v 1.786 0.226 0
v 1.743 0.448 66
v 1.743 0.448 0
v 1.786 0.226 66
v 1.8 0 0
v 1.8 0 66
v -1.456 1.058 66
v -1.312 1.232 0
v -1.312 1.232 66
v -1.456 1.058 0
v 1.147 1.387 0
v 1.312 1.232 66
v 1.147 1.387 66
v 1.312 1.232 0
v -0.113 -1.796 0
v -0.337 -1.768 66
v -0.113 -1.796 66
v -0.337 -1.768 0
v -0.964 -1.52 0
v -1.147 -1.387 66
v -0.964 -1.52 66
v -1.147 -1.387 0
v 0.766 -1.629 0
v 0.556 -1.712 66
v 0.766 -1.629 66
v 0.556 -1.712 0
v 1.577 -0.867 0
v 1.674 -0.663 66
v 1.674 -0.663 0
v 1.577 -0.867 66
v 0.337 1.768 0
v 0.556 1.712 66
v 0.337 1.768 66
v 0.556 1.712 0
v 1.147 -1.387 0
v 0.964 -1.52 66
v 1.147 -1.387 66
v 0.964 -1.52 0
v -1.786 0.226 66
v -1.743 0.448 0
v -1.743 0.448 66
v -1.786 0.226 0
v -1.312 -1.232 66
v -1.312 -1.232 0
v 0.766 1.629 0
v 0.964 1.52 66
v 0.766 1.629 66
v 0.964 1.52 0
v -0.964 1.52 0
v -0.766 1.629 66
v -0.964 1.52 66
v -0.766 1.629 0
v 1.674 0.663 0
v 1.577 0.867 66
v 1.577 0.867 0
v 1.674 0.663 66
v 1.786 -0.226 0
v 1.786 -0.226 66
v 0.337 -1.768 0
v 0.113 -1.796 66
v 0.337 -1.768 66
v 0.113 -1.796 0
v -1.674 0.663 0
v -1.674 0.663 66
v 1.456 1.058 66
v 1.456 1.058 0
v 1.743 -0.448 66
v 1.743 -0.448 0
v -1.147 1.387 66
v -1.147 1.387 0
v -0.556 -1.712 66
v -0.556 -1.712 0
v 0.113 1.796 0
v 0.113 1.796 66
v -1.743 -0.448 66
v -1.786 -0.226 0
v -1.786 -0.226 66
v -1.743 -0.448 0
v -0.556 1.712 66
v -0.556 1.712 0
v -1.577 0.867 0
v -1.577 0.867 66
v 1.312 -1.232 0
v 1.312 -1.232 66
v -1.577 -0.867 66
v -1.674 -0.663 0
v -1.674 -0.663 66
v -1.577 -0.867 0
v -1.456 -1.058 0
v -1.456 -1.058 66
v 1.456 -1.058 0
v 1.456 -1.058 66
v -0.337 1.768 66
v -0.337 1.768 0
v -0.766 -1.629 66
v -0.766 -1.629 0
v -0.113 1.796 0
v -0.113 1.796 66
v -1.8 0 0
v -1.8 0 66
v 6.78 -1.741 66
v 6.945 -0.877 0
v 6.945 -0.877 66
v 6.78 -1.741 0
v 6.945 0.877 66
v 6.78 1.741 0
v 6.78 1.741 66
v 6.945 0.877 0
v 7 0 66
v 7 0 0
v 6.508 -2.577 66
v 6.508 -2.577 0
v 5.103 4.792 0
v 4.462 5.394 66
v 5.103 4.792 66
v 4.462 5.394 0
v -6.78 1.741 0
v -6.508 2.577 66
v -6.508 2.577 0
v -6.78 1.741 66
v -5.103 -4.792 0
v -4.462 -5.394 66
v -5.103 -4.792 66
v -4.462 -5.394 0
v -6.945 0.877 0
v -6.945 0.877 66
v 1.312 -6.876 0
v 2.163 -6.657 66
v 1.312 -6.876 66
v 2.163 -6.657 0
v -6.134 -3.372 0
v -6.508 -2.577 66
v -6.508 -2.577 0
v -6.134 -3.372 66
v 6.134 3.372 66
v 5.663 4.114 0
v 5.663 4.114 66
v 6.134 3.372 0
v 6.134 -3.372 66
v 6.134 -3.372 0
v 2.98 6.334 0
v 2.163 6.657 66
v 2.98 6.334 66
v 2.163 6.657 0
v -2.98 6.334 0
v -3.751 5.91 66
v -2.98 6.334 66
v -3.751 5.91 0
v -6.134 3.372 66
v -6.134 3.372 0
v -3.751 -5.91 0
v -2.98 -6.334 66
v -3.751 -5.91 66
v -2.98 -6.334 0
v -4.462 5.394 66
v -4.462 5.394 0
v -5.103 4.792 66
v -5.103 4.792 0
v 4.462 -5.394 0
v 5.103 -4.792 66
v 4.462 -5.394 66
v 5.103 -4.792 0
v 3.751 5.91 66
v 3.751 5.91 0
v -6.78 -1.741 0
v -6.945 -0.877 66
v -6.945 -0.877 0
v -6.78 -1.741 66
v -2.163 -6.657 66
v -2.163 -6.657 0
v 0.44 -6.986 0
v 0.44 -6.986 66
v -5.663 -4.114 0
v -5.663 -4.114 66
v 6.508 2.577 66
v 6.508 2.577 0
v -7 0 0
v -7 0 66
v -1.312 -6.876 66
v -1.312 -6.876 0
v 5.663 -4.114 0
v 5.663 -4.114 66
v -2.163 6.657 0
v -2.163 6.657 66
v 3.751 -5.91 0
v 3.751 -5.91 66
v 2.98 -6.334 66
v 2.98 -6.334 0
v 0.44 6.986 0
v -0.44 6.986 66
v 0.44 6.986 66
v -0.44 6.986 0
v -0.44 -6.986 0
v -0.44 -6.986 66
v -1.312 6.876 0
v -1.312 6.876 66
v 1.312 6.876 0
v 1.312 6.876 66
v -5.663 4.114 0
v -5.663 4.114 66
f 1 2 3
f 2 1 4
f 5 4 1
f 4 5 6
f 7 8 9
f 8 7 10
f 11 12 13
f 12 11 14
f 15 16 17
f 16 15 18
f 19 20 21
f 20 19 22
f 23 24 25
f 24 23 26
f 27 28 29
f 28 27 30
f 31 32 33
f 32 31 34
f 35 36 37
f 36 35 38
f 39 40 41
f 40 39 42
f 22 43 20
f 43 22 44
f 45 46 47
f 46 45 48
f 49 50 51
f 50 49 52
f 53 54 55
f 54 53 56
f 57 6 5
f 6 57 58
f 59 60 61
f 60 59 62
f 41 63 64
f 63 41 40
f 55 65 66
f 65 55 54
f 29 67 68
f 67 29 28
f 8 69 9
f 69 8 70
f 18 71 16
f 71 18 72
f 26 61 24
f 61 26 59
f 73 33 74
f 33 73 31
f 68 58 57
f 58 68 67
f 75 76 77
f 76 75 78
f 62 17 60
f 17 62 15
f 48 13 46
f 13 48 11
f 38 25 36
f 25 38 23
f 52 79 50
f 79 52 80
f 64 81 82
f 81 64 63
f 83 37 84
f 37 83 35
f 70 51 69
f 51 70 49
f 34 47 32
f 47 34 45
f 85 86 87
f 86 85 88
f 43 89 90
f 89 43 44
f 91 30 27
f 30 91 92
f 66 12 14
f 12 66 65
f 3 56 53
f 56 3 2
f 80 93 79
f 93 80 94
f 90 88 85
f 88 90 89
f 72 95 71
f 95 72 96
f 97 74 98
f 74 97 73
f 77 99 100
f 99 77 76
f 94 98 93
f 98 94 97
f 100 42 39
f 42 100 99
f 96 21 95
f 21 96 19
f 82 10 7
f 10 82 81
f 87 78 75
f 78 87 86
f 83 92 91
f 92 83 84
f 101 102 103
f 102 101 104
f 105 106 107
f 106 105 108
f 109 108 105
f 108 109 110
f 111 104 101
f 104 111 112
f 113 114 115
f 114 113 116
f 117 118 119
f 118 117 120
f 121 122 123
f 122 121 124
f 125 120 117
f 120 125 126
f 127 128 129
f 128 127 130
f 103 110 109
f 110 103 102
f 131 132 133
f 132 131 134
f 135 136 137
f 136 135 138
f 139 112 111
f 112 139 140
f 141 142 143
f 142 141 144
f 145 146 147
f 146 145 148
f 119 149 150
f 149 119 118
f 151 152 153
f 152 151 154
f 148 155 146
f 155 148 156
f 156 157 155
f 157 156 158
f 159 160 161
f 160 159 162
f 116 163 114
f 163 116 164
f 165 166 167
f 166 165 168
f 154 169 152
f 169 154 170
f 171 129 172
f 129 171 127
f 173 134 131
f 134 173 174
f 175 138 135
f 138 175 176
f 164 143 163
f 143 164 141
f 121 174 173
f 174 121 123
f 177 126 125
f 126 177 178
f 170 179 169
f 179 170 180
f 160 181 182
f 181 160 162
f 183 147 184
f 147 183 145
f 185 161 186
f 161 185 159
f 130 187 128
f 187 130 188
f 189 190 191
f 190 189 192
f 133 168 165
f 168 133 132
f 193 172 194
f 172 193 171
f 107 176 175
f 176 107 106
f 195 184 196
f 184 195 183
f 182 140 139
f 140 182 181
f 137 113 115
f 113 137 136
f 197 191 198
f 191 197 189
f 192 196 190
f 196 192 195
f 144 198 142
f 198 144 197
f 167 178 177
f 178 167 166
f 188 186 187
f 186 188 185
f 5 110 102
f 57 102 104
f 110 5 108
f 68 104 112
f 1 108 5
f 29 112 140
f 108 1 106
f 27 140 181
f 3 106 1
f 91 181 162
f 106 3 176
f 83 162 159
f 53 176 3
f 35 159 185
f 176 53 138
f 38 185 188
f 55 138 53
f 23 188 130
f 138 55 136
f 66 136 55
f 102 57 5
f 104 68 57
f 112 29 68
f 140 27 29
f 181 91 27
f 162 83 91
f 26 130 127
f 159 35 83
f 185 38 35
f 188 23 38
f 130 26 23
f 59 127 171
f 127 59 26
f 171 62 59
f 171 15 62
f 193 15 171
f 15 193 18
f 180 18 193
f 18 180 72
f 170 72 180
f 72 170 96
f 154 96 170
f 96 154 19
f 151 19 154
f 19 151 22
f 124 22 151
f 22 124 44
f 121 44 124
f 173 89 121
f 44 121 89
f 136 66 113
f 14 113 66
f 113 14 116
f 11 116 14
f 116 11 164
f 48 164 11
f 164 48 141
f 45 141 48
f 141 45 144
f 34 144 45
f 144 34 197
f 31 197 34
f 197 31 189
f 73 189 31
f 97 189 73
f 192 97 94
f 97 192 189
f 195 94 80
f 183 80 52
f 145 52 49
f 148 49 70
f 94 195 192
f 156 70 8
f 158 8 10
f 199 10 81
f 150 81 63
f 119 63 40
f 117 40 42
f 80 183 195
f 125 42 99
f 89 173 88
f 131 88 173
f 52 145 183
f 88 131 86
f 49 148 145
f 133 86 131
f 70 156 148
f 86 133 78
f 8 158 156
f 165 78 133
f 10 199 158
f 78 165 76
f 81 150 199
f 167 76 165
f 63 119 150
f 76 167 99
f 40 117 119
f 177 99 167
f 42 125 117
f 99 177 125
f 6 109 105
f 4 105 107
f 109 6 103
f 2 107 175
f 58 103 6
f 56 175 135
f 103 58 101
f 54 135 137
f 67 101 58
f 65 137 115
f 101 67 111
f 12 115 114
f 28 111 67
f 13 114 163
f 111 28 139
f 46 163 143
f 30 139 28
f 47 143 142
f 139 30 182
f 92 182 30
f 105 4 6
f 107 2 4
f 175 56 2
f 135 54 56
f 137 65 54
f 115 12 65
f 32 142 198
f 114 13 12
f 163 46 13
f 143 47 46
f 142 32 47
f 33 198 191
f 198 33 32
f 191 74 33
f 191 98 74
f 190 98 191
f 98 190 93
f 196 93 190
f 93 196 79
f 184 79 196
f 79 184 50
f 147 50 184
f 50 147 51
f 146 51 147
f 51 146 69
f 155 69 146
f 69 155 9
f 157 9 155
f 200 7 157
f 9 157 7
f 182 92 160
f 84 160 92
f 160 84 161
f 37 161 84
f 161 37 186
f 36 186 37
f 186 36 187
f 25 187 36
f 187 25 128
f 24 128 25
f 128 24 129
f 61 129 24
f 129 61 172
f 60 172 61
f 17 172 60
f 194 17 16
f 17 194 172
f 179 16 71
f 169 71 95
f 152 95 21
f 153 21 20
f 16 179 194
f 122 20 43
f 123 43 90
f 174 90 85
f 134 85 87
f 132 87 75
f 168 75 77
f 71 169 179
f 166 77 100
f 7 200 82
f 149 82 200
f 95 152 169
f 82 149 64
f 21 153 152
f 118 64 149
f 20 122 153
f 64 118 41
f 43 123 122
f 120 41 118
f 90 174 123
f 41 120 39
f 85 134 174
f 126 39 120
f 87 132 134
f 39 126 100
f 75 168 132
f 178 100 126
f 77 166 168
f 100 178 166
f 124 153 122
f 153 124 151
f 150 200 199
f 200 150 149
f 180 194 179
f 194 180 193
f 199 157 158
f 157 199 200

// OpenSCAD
$fn = 50;


difference() {
	union() {
		cylinder(h = 66, r = 7.0000000000);
	}
	union() {
		translate(v = [0, 0, -100]) {
			cylinder(h = 200, r = 1.8000000000);
		}
		translate(v = [0, 0, -100]) {
			cylinder(h = 200, r = 1.8000000000);
		}
	}
}
